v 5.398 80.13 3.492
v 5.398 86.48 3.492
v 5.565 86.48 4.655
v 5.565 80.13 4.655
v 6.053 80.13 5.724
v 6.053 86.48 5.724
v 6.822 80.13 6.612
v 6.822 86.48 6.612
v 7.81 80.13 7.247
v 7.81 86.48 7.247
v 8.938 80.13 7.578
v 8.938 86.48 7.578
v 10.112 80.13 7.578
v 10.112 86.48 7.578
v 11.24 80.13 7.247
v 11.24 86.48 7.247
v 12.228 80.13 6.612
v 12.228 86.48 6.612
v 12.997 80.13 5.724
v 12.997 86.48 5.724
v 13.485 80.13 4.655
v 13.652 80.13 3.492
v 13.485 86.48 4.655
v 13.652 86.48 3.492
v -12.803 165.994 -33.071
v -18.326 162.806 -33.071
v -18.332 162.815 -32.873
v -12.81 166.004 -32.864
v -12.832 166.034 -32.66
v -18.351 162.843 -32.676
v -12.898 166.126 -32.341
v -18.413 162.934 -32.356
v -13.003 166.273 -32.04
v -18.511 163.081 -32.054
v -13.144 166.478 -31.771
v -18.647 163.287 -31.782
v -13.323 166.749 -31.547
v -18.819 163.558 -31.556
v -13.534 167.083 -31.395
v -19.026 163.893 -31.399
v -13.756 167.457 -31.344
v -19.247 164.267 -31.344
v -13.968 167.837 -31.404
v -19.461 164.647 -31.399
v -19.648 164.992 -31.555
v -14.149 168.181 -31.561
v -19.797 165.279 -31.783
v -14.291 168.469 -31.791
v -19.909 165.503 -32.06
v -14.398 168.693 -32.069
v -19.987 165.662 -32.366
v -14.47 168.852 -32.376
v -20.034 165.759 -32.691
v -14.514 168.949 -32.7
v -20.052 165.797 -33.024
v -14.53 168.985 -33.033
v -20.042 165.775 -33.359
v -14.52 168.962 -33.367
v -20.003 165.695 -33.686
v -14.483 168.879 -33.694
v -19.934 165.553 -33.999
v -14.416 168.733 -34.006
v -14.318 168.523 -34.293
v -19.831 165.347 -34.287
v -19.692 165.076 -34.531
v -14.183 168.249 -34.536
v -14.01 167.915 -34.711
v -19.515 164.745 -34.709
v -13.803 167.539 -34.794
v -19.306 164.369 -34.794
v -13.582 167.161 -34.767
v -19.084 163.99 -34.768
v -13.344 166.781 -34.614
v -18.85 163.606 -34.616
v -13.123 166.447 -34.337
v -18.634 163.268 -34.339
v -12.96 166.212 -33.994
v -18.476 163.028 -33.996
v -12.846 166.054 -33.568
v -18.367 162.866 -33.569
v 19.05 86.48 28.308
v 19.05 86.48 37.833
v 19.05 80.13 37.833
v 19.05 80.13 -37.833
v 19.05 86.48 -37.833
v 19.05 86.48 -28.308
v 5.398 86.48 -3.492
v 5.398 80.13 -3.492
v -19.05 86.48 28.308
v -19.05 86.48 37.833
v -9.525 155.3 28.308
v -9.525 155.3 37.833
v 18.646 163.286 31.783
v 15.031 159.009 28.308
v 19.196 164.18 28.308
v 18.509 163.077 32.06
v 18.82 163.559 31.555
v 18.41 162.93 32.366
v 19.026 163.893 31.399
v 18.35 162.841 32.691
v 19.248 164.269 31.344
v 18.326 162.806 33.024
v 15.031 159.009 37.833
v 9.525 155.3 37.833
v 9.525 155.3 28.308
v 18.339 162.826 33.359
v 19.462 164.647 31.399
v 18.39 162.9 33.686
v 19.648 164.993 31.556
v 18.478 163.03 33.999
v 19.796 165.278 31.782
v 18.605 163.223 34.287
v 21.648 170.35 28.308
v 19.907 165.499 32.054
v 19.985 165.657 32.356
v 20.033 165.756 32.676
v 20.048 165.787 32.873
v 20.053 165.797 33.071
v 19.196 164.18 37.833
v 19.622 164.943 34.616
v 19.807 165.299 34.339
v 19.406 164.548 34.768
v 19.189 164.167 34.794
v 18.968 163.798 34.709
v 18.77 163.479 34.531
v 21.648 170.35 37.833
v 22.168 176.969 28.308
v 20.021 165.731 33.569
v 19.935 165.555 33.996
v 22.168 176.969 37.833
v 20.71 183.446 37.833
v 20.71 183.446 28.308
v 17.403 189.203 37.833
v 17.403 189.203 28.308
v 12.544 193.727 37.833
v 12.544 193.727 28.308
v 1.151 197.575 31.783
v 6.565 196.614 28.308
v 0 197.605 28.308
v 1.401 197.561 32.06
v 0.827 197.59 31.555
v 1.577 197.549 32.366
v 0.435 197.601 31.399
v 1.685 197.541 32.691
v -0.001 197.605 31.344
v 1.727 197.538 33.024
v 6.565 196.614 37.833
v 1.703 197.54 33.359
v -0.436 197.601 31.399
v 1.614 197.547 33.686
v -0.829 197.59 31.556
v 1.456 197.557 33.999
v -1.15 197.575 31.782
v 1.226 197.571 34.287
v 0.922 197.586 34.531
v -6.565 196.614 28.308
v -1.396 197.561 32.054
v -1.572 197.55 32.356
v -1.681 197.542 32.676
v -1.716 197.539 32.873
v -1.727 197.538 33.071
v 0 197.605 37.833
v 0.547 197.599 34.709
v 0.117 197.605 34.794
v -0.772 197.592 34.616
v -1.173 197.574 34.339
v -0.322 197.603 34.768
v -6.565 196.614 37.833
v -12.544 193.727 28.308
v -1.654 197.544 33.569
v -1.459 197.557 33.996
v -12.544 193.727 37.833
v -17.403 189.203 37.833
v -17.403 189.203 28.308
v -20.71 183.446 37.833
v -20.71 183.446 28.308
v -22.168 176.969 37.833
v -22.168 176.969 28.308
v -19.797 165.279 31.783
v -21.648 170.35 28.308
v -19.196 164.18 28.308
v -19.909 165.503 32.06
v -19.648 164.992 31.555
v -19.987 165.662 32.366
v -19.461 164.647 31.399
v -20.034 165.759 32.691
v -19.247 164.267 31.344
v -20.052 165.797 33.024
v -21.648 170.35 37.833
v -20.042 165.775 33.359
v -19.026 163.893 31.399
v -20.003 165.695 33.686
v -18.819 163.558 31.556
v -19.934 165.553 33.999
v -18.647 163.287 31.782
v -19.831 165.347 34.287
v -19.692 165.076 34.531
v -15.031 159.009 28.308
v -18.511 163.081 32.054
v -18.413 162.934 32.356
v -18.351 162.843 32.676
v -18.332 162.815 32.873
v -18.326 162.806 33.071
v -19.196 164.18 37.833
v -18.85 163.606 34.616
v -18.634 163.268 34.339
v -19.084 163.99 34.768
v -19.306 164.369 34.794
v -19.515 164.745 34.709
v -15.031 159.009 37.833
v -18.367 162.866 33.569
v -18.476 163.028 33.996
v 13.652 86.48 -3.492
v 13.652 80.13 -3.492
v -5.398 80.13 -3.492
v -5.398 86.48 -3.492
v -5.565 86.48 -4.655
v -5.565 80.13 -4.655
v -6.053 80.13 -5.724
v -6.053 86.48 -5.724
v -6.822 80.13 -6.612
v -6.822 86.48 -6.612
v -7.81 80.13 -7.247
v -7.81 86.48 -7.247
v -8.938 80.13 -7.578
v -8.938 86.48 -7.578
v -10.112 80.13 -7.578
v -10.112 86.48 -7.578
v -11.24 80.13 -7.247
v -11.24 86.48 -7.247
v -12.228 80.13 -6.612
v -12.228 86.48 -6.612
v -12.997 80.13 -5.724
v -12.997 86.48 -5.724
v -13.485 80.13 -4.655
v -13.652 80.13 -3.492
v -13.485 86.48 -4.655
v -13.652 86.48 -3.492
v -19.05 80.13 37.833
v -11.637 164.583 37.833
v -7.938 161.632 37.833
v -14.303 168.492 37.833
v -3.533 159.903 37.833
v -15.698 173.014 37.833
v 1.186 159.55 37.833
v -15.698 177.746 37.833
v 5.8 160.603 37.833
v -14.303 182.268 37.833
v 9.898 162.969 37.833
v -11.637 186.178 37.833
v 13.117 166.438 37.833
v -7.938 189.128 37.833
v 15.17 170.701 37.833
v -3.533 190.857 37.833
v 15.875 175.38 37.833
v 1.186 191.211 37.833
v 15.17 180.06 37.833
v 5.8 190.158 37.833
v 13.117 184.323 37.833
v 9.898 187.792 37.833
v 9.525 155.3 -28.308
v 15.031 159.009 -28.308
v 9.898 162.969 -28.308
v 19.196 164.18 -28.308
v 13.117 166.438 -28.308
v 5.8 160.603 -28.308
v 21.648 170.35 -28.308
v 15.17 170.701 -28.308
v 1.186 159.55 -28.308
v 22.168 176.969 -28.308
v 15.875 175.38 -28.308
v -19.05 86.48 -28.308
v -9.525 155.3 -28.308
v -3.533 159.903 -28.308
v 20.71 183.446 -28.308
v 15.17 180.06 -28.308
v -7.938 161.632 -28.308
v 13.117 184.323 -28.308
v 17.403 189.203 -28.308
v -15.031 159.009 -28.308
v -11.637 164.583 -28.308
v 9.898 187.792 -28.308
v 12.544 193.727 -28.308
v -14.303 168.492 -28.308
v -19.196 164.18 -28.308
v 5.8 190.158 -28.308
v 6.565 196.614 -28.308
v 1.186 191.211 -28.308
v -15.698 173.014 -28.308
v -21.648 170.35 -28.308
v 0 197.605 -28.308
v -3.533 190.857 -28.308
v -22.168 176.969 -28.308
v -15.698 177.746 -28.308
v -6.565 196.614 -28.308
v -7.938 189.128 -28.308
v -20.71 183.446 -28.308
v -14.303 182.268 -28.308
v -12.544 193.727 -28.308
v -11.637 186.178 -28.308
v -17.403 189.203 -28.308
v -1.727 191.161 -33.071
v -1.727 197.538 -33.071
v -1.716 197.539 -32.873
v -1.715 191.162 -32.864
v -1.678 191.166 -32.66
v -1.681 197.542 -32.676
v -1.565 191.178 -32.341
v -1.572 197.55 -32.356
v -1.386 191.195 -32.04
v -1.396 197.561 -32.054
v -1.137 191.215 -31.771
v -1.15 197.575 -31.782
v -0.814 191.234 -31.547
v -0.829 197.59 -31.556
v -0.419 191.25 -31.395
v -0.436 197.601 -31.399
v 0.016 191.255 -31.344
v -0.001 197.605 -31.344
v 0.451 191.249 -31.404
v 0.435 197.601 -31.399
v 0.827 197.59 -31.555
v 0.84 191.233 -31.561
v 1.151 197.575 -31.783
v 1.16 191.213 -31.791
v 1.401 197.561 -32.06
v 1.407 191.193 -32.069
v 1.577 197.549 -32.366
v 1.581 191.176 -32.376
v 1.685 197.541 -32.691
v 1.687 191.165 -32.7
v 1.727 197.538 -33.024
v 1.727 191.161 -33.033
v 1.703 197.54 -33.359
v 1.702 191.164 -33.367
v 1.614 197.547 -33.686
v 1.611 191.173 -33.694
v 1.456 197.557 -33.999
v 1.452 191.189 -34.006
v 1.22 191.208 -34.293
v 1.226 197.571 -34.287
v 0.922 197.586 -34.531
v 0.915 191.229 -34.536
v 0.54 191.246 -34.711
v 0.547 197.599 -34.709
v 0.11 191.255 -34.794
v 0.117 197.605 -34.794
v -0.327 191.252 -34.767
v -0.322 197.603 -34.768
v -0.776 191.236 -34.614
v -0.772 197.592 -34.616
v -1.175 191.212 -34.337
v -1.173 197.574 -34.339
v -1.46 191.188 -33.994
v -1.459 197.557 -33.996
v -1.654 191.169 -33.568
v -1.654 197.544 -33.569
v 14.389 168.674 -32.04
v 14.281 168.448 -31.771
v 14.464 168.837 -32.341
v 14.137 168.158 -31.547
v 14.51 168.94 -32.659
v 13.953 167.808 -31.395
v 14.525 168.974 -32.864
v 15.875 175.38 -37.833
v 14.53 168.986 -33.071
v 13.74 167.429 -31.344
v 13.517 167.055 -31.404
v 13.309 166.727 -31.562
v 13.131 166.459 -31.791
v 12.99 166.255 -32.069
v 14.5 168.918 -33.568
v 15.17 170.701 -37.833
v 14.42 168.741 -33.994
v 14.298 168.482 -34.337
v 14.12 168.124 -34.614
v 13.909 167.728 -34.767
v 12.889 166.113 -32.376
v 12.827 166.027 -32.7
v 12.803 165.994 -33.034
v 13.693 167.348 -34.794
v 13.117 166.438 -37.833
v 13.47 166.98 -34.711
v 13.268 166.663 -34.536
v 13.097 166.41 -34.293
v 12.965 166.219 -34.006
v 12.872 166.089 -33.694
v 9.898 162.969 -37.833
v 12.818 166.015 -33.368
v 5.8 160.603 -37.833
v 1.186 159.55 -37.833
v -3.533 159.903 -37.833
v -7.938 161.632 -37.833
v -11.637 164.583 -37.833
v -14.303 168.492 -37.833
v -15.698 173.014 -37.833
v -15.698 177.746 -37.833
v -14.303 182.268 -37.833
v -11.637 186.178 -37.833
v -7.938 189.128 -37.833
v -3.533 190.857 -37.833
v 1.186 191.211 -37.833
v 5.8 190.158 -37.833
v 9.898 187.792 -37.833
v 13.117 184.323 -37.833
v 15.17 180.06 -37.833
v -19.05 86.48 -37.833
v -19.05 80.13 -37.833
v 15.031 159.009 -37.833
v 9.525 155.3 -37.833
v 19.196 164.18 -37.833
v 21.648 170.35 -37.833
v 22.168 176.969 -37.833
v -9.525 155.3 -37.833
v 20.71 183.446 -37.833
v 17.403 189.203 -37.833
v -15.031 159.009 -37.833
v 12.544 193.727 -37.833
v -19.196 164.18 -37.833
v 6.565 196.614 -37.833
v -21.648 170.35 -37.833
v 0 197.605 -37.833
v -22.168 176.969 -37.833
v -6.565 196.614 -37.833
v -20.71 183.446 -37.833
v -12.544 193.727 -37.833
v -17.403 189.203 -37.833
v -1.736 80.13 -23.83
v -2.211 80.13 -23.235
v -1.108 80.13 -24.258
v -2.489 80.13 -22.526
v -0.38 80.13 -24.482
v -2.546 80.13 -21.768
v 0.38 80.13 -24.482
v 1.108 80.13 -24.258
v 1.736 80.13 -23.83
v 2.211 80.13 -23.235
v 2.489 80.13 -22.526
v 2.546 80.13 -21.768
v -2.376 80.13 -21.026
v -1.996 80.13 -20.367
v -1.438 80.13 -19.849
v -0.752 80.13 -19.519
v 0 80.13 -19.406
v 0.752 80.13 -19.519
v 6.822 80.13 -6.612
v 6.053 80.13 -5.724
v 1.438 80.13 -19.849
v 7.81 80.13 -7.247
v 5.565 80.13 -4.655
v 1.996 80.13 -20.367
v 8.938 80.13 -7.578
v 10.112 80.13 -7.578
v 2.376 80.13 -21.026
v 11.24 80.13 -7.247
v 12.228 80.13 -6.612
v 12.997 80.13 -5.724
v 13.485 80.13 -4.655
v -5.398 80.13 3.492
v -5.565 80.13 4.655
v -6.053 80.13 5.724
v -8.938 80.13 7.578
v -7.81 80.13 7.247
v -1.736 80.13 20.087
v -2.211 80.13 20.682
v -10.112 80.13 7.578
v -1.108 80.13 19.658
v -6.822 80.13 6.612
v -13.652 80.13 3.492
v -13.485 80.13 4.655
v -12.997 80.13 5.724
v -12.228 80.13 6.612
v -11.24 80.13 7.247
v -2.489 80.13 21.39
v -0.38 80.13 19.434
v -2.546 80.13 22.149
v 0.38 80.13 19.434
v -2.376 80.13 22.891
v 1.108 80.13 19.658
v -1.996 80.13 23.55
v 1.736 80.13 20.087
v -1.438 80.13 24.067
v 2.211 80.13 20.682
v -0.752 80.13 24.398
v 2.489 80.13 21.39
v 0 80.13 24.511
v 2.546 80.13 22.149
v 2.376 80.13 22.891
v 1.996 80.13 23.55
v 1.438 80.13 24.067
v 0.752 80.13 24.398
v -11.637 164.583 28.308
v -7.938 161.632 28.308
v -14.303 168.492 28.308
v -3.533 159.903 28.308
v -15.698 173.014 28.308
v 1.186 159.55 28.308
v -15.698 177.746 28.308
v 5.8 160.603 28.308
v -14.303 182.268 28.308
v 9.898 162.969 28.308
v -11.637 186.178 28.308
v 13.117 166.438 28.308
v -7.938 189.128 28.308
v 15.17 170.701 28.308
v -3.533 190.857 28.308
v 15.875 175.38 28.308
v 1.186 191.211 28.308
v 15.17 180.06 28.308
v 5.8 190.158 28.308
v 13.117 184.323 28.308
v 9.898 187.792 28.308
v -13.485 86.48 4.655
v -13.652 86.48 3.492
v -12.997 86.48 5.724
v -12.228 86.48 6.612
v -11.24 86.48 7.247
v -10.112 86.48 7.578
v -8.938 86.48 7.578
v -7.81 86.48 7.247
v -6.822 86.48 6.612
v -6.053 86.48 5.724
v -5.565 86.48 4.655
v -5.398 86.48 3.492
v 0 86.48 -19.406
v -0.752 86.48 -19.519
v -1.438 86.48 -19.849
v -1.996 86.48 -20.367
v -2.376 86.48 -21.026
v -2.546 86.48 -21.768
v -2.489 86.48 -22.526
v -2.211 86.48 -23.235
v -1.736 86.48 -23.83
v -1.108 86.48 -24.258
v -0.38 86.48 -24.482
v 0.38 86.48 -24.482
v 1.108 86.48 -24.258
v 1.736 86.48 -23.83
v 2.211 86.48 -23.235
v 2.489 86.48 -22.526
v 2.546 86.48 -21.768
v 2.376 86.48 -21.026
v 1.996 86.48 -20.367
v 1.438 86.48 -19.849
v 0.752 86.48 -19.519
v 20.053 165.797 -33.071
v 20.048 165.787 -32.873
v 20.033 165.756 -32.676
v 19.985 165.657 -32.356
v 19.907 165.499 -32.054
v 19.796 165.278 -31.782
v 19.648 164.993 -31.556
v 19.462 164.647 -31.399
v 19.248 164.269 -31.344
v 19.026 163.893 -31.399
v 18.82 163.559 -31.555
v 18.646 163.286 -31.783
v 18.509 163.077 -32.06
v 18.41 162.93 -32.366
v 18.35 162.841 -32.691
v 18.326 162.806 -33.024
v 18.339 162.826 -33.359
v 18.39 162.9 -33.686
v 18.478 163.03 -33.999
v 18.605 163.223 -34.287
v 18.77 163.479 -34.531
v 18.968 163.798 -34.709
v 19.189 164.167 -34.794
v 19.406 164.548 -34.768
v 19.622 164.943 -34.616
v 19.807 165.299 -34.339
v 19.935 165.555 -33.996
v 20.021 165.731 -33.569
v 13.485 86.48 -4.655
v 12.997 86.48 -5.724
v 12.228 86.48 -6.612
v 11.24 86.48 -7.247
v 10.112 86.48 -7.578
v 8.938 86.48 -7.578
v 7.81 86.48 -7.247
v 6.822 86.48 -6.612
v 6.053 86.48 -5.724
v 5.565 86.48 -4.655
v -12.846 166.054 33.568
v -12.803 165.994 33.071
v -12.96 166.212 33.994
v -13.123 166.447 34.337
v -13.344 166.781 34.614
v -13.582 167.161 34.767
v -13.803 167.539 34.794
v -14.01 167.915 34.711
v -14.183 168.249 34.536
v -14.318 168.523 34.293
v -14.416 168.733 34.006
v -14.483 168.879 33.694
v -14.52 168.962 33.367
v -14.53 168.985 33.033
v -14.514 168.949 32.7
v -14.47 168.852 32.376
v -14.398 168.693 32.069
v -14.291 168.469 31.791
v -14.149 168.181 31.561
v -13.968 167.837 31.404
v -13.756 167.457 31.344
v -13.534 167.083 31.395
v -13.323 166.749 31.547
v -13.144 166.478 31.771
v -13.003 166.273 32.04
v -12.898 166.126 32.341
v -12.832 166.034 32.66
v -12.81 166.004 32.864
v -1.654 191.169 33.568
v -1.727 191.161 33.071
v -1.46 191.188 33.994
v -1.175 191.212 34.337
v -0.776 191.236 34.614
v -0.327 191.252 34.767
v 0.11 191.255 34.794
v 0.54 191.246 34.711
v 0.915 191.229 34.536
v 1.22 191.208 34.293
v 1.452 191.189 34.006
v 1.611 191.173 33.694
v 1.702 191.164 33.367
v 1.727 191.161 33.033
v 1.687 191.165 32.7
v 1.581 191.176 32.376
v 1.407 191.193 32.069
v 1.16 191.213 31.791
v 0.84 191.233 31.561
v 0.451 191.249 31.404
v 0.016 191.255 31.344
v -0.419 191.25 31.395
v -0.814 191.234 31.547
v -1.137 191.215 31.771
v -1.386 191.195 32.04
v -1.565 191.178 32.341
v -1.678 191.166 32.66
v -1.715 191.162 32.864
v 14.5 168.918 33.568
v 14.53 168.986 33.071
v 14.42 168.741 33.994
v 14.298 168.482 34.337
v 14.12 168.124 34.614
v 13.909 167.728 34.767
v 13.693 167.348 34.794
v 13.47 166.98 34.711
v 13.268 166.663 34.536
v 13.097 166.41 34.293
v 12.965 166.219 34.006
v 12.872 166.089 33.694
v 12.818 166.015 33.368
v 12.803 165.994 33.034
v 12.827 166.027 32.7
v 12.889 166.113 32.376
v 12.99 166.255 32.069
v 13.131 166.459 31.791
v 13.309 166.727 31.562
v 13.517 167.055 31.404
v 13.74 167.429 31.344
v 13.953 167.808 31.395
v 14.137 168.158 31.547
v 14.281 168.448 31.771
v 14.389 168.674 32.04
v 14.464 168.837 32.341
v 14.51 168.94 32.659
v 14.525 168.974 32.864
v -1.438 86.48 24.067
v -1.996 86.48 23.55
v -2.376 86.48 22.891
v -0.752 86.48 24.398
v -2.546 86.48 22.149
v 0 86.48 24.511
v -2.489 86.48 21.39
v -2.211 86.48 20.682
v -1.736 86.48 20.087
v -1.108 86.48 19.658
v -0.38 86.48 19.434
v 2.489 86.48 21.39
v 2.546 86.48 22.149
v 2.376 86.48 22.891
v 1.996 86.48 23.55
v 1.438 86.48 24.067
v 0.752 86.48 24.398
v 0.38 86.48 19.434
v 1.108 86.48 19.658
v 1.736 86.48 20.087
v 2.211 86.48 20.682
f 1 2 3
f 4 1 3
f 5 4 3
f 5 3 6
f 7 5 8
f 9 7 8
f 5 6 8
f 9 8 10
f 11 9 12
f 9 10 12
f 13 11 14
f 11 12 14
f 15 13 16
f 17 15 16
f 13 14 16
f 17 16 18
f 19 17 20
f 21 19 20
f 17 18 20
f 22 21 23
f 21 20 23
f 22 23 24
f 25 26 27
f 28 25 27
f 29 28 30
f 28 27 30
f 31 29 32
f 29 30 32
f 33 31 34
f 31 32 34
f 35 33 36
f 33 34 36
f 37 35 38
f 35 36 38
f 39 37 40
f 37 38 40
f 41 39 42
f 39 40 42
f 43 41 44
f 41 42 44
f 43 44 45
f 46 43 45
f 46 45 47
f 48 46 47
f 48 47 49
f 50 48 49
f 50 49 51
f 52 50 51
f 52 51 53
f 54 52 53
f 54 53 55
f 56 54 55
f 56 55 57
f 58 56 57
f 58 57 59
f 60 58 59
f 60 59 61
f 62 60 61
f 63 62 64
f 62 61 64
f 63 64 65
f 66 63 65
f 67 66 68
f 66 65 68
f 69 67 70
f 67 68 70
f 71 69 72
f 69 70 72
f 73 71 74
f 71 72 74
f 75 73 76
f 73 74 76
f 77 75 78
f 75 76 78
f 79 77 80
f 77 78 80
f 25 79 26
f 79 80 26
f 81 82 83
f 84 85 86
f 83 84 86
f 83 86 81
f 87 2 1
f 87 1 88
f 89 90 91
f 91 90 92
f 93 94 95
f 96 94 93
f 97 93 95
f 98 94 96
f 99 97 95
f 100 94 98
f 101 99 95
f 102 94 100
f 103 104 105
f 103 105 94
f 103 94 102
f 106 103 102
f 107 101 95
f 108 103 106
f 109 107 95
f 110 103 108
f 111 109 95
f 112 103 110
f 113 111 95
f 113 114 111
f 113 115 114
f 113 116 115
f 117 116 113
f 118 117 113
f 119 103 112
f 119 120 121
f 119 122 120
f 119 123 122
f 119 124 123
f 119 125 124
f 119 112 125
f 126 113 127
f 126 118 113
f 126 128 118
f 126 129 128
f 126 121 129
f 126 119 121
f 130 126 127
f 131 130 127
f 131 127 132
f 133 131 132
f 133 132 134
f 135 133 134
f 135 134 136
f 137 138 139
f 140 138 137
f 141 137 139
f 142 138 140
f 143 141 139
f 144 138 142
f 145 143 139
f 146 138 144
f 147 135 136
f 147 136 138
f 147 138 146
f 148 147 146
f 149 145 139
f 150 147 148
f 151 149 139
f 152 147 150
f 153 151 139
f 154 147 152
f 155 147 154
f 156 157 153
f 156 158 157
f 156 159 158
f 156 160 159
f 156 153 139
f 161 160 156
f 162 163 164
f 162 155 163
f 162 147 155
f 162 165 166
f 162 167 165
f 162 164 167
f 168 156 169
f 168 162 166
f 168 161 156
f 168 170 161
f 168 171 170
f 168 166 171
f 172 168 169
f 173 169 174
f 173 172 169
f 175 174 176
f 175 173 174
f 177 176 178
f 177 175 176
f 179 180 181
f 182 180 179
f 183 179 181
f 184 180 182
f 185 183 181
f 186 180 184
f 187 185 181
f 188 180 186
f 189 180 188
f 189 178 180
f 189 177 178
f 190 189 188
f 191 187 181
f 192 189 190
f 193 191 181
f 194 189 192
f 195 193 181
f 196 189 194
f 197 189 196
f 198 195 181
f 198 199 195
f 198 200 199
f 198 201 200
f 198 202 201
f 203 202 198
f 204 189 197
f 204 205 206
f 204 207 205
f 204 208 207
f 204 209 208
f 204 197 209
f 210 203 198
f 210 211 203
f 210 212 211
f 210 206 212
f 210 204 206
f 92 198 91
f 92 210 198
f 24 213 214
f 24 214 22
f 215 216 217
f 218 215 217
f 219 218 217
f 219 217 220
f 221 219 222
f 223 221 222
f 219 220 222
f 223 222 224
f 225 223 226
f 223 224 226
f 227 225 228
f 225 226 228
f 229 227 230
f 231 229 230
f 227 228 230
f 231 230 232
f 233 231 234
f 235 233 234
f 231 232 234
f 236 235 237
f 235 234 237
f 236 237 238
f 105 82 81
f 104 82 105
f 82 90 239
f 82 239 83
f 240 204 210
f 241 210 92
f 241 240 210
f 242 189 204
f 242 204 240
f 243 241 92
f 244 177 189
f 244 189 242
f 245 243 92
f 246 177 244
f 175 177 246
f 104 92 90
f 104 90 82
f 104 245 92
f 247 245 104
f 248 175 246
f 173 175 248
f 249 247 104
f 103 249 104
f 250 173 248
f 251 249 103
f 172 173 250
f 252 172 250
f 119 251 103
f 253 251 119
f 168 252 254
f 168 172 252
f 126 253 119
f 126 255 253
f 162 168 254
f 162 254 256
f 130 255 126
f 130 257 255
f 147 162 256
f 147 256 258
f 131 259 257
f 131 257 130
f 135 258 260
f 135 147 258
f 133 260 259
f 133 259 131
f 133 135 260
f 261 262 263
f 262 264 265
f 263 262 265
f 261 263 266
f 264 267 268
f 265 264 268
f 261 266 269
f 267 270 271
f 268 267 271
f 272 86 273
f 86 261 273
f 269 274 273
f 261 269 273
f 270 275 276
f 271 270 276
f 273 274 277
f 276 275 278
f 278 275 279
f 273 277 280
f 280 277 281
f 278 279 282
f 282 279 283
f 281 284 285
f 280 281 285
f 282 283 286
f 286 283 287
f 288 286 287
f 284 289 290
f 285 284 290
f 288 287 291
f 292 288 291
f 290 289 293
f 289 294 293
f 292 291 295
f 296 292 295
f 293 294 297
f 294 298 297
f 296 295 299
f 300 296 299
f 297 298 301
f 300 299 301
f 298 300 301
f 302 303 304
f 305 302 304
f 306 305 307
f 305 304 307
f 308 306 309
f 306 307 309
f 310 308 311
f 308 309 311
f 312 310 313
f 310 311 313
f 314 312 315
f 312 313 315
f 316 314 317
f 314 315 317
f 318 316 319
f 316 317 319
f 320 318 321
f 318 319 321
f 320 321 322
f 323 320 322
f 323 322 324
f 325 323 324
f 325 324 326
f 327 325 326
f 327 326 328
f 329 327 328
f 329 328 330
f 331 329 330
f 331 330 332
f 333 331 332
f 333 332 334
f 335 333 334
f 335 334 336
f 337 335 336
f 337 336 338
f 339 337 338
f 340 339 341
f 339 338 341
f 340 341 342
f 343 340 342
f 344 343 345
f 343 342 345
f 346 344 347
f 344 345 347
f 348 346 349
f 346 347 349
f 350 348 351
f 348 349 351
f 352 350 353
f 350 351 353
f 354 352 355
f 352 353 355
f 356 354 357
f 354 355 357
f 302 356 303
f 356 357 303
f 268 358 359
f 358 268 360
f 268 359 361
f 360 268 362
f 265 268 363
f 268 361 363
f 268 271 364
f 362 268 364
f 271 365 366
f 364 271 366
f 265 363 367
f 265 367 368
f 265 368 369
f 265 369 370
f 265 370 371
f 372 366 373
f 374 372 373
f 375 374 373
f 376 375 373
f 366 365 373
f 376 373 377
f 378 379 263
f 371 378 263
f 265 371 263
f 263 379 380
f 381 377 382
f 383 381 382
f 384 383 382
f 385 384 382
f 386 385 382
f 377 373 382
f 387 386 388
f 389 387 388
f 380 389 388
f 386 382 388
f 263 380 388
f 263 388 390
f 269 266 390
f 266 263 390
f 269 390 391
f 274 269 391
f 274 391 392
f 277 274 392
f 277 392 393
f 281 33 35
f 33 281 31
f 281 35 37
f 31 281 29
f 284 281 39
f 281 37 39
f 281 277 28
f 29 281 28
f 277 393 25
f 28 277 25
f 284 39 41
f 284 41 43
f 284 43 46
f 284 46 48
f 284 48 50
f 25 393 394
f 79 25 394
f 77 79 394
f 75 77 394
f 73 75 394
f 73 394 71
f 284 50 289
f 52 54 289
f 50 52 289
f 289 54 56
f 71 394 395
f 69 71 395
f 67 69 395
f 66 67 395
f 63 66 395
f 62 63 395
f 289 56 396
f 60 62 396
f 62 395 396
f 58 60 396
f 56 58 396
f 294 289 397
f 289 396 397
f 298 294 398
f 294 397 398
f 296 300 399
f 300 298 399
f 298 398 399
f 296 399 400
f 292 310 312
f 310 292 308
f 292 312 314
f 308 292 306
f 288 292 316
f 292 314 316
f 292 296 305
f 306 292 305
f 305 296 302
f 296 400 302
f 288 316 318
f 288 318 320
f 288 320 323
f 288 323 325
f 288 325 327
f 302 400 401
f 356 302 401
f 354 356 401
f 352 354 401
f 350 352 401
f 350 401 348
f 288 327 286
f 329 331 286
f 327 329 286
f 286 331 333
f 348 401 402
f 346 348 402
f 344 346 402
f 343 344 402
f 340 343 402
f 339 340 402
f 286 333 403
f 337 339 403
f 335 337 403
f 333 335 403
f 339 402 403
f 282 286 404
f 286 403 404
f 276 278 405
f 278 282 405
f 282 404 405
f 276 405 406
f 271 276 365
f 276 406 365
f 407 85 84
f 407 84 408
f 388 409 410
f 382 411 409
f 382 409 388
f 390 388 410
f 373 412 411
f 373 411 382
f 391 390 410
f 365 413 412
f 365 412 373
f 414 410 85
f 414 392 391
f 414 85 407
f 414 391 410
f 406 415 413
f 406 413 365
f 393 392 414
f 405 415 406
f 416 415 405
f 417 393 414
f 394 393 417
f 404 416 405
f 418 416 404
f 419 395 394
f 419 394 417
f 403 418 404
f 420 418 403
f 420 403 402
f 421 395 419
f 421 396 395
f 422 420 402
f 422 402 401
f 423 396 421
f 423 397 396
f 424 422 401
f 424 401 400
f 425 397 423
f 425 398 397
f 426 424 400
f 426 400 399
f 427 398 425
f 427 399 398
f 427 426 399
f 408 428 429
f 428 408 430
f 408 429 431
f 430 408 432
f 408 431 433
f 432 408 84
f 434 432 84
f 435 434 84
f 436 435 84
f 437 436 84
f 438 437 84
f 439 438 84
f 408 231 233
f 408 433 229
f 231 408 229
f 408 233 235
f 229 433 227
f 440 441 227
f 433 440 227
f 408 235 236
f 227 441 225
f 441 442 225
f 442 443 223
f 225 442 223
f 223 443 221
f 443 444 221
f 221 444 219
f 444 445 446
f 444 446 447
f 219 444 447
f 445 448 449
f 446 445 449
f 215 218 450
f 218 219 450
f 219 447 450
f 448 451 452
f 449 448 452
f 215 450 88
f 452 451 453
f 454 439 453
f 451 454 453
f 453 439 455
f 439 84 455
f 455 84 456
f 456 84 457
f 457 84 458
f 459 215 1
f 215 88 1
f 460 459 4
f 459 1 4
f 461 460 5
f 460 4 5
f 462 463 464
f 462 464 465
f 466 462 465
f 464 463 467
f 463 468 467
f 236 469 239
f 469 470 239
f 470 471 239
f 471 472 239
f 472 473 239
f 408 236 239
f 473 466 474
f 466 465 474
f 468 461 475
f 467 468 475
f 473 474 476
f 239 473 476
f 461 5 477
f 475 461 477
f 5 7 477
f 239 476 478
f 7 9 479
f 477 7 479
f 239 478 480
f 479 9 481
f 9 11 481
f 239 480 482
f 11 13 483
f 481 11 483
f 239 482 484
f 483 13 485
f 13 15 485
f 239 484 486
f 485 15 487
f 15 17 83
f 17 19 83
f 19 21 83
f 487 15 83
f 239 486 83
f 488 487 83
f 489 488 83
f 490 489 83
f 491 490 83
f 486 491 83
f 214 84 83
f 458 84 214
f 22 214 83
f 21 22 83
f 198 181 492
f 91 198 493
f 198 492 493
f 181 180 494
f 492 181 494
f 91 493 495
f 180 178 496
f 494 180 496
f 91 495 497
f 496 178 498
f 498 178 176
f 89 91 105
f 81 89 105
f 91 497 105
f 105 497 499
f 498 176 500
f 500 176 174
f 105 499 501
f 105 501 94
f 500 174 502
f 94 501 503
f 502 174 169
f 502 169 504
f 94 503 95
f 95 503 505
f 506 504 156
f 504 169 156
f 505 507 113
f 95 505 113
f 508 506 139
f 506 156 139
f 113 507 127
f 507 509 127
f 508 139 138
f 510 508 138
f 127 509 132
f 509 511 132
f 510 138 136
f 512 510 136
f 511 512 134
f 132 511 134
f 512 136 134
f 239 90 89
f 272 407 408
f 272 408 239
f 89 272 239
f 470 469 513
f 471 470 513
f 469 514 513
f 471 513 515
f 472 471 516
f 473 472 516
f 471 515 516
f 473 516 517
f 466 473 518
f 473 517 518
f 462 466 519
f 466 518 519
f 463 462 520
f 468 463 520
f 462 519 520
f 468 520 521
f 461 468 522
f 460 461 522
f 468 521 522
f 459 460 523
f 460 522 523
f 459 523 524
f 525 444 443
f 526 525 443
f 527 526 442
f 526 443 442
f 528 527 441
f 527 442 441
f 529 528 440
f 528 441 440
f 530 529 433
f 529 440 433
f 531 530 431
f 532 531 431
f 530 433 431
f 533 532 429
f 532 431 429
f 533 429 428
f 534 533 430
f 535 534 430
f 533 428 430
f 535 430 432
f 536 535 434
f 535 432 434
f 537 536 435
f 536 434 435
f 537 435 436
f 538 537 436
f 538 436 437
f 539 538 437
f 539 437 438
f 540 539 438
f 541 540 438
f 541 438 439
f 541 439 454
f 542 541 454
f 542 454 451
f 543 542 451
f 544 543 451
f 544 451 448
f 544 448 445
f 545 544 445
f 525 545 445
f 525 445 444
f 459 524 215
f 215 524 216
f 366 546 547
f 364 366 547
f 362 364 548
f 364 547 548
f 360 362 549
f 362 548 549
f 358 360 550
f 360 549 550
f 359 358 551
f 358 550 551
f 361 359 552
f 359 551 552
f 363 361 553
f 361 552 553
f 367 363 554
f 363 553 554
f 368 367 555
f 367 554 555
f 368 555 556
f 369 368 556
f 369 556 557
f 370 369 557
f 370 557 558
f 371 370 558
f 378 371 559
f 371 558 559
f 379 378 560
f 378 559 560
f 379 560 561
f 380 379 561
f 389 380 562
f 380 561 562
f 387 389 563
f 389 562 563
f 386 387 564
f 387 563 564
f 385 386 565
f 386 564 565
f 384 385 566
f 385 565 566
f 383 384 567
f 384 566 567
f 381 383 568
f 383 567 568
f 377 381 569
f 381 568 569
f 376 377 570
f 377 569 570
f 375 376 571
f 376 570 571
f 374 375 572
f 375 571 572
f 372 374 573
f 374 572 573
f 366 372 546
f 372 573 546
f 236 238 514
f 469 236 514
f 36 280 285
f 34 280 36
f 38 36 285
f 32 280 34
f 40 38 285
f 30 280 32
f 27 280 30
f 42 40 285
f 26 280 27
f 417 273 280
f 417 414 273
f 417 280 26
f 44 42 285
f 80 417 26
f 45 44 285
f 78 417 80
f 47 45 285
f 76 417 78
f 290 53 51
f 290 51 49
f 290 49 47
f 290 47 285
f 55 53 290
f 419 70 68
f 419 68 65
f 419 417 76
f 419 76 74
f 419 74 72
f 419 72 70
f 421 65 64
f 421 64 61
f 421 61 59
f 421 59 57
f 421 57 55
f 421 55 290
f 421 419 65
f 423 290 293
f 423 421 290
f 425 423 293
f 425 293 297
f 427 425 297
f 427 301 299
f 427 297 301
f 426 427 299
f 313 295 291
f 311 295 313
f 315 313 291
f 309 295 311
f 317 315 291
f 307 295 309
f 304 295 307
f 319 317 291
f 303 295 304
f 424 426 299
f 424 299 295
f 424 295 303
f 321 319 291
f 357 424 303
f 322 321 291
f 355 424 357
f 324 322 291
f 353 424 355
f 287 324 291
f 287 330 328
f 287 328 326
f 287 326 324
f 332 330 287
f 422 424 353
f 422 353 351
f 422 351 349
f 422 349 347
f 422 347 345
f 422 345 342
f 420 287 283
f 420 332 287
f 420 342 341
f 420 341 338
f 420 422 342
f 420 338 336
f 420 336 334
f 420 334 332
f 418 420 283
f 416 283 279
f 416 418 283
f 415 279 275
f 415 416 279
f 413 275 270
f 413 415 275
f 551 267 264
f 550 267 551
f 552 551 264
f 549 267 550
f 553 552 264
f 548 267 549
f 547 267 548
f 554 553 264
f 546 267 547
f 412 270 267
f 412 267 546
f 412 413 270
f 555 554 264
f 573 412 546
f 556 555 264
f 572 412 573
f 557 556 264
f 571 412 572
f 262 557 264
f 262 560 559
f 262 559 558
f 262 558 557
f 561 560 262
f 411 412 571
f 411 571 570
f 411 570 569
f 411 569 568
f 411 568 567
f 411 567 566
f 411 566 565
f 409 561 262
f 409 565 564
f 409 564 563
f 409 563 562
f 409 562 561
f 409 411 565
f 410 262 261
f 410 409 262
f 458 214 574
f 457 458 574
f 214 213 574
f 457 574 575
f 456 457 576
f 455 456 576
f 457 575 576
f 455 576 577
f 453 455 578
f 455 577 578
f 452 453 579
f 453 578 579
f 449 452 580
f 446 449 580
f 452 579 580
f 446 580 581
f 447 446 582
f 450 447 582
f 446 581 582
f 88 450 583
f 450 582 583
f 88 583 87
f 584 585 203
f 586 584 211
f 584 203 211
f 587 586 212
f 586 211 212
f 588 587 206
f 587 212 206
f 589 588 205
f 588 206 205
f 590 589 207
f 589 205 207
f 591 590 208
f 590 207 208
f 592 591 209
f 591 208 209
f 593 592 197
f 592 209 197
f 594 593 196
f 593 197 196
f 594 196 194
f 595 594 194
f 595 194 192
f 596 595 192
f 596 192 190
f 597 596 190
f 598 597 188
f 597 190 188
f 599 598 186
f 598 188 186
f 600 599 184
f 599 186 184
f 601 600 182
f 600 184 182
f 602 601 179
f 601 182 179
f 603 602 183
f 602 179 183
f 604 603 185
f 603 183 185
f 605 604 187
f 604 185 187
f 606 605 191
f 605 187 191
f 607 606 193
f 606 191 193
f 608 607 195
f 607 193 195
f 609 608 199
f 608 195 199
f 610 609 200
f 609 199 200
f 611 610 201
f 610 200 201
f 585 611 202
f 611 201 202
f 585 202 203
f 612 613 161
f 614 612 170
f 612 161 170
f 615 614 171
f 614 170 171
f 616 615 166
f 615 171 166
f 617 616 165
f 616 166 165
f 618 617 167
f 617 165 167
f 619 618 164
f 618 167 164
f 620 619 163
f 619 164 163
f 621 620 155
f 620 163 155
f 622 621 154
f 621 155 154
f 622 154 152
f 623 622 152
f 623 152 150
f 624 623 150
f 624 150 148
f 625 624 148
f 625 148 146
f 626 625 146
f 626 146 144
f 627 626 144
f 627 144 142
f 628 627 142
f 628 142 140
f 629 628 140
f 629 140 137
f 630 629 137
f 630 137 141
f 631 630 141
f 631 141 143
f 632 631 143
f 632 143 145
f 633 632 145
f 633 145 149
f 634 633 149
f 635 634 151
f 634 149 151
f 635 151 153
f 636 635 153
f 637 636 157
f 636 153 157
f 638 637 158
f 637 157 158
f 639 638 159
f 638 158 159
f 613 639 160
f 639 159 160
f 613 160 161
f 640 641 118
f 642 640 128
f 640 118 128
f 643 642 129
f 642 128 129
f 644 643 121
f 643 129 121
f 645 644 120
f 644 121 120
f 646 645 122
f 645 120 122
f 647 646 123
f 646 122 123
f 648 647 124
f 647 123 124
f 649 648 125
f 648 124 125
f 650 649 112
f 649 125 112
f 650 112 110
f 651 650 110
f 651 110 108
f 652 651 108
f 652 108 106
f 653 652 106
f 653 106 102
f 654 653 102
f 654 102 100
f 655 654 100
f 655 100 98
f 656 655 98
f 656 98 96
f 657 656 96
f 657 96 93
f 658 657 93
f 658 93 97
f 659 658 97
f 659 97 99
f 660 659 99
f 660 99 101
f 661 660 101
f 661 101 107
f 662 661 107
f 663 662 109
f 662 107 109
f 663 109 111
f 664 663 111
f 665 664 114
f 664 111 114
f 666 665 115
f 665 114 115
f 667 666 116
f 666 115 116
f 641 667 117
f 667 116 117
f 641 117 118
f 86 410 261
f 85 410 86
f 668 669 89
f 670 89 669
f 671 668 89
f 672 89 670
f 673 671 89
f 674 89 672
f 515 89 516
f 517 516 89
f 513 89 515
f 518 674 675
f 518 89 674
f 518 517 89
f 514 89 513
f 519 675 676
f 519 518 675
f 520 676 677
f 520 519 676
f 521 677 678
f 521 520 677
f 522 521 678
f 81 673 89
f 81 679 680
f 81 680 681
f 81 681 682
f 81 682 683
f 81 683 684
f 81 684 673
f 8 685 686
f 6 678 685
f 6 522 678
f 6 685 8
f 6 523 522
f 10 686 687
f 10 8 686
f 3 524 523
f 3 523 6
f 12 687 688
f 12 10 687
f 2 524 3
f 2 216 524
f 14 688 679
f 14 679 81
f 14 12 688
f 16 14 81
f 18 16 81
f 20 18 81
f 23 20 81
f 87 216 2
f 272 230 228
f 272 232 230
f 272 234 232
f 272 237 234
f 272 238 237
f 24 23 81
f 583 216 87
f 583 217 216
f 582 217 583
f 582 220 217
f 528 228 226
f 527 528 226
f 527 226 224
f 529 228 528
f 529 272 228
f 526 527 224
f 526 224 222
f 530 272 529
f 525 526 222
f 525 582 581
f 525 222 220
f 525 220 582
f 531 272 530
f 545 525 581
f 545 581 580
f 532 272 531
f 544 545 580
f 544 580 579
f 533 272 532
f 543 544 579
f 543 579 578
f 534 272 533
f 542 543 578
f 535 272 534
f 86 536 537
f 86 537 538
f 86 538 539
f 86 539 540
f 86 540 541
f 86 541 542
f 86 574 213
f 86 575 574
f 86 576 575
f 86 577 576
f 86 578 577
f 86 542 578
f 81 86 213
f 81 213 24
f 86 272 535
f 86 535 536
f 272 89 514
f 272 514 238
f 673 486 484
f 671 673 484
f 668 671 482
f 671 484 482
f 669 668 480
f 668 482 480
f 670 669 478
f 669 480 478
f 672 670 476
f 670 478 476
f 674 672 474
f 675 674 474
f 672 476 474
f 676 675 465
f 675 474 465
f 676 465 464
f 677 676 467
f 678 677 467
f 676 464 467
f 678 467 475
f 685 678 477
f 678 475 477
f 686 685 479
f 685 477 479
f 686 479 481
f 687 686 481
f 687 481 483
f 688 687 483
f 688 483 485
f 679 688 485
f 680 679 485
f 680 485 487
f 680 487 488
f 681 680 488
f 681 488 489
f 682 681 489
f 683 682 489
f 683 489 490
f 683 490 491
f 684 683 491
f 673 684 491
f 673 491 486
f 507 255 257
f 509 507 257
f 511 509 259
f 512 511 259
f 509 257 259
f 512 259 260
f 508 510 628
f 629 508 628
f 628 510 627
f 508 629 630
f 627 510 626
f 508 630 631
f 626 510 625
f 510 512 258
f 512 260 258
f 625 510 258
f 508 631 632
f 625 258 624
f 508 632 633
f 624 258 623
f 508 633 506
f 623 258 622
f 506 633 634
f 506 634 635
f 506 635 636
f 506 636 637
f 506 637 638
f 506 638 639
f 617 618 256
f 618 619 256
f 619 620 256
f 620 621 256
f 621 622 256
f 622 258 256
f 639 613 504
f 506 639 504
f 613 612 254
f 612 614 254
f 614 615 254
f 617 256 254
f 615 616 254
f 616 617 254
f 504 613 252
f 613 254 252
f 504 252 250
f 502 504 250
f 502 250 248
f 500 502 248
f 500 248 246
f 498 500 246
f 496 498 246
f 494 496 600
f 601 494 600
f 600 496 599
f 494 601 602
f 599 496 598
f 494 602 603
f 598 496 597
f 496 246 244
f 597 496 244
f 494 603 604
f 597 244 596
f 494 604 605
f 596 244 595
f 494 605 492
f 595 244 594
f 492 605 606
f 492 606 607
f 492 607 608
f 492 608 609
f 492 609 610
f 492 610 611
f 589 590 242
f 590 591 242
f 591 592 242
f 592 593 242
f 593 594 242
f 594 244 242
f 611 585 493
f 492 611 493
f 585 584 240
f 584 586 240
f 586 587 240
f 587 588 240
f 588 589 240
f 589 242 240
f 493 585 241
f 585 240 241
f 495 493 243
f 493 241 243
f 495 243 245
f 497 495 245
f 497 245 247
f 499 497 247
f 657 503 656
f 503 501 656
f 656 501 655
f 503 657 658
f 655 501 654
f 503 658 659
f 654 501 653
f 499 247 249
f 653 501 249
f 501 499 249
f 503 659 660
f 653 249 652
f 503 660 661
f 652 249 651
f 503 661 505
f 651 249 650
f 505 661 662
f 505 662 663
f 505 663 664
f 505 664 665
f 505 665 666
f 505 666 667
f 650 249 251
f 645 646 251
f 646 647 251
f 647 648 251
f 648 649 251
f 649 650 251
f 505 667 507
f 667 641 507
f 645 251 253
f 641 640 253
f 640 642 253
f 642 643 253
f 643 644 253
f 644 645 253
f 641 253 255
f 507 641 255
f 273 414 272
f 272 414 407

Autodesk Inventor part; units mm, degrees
ref_plane "YZ Plane" through (0, 0, 0) normal (1, 0, 0) x (0, 1, 0)
sketch "Sketch1" plane through (0, 0, 0) normal (0, 0, 1) x (1, 0, 0)
  arc A0 (19.05, 73.7803) -> (-19.05, 73.7803) centre (0, 0) ccw
  line L0 (0, 86.4803) -> (19.05, 86.4803)
  line L1 (19.05, 86.4803) -> (19.05, 73.7803)
  line L2 (0, 76.2) -> (0, 86.4803) construction
  line L3 (0, 86.4803) -> (-19.05, 86.4803)
  line L4 (-19.05, 86.4803) -> (-19.05, 73.7803)
  dimension "d0" = 152.4
  dimension "d1" = 19.05
  dimension "d2" = 12.7
extrude "Extrusion1" add sketch "Sketch1" along normal mid plane 75.6666
sketch "Sketch2" plane through (-19.05, 86.4803, 37.8333) normal (0, 1, 0) x (1, 0, 0)
  line L0 (0, 75.6666) -> (0, 0) construction
  line L1 (0, 37.8333) -> (38.1, 37.8333) construction
  line L2 (38.1, 75.6666) -> (38.1, 0) construction
  line L3 (0, 75.6666) -> (38.1, 75.6666) construction
  line L4 (19.05, 75.6666) -> (19.05, 0) construction
  line L5 (38.1, 0) -> (0, 0) construction
  line L6 (28.575, 34.3408) -> (28.575, 41.3258) construction
  line L7 (24.4475, 34.3408) -> (24.4475, 41.3258)
  line L8 (32.7025, 41.3258) -> (32.7025, 34.3408)
  arc A0 (24.4475, 34.3408) -> (32.7025, 34.3408) centre (28.575, 34.3408) ccw
  arc A1 (32.7025, 41.3258) -> (24.4475, 41.3258) centre (28.575, 41.3258) ccw
  line L9 (13.6525, 34.3408) -> (13.6525, 41.3258)
  line L10 (5.3975, 41.3258) -> (5.3975, 34.3408)
  arc A2 (5.3975, 34.3408) -> (13.6525, 34.3408) centre (9.525, 34.3408) ccw
  arc A3 (13.6525, 41.3258) -> (5.3975, 41.3258) centre (9.525, 41.3258) ccw
  point P0 (19.05, 37.8333)
  point P1 (28.575, 37.8333)
  dimension "d5" = 9.525
  dimension "d6" = 8.255
  dimension "d7" = 15.24
  dimension "d8" = 19.05
  dimension "d170" = 8.255
extrude "Extrusion2" cut sketch "Sketch2" against normal through all
ref_plane "Work Plane1" through (19.05, 73.7803, 37.8333) normal (0, 1, 0) x (-1, 0, 0)
sketch "Sketch5" plane through (0, 0, 37.8333) normal (0, 0, 1) x (1, 0, 0)
  circle A0 centre (0, 175.3803) radius 15.875
  arc A1 (9.525, 155.2999) -> (-9.525, 155.2999) centre (0, 175.3803) ccw
  arc A2 (19.05, 73.7803) -> (-19.05, 73.7803) centre (0, 0) ccw construction
  line L0 (-19.05, 73.7803) -> (19.05, 73.7803) construction
  line L1 (19.05, 86.4803) -> (9.525, 155.2999)
  line L2 (19.05, 86.4803) -> (-19.05, 86.4803) construction
  line L3 (0, 86.4803) -> (0, 175.3803) construction
  line L4 (-19.05, 86.4803) -> (-9.525, 155.2999)
  line L5 (-19.05, 86.4803) -> (19.05, 86.4803)
  dimension "d15" = 31.75
  dimension "d16" = 6.35
  dimension "d17" = 101.6
  dimension "d18" = 9.525
extrude "Extrusion4" add sketch "Sketch5" against normal blind 9.525
ref_plane "Work Plane2" through (0, 197.6053, 37.8333) normal (0, 1, 0) x (-1, 0, 0)
sketch "Sketch6" plane through (0, 197.6053, 37.8333) normal (0, 1, 0) x (-1, 0, 0)
  line L0 (-22.225, -9.525) -> (22.225, -9.525) projected
  circle A0 centre (0, -4.7625) radius 1.7272
  point P0 (0, -37.8333)
  point P1 (9.525, -9.525)
  point P2 (-9.525, -9.525)
  dimension "d21" = 4.7625
  dimension "d22" = 3.4544
extrude "Extrusion5" cut sketch "Sketch6" against normal up to surface
pattern_circular "Circular Pattern1" count 3 over 360 about axis through (0, 175.3803, 37.8333) along (0, 0, -1) of "Extrusion5"
mirror "Mirror1" about plane through (0, 0, 0) normal (0, 0, 1) of "Extrusion4", "Extrusion5", "Circular Pattern1"
sketch "Sketch20" plane through (19.05, 73.7803, 37.8333) normal (1, 0, 0) x (0, 0, -1)
  line L0 (0, 12.7) -> (0, 0) projected
  line L1 (75.6666, 12.7) -> (75.6666, 0) projected
  line L2 (0, 0) -> (75.6666, 0)
  line L3 (75.6666, 0) -> (75.6666, 6.35)
  line L4 (75.6666, 6.35) -> (0, 6.35)
  line L5 (0, 6.35) -> (0, 0)
  point P0 (37.8333, -73.7803)
  point P1 (0, 6.35)
extrude "Extrusion7" cut sketch "Sketch20" against normal through all
sketch "Sketch22" plane through (-19.05, 86.4803, 28.3083) normal (0, 1, 0) x (1, 0, 0)
  line L0 (41.275, 0) -> (-3.175, 0) projected
  line L1 (41.275, 56.6166) -> (-3.175, 56.6166) projected
  line L2 (-3.175, 66.1416) -> (41.275, 66.1416) projected
  point P0 (19.05, 28.3083)
  point P1 (19.05, 6.35)
  point P2 (19.05, 50.2666)
  point P3 (9.525, 0)
  point P4 (28.575, 0)
  point P5 (9.525, 56.6166)
  point P6 (28.575, 56.6166)
  point P7 (28.575, 66.1416)
  point P8 (9.525, 66.1416)
  dimension "d173" = 6.35
  dimension "d174" = 6.35
  dimension "d183" = 15.875
hole "Hole1" at (0, 86.4803, 21.9583) at (0, 86.4803, -21.9583) direction (0, -1, 0) diameter 5.1054 end through all clearance for "Socket Head Cap Screw" size "#10" standard "Ansi Unified Screw Threads"
equation "\"d51\" = 0.125 * Sketch8_Pitch"
equation "\"Sketch8_Pitch\" = 0.79375"
equation "\"d53\" = 60deg"
equation "\"d72\" = 0.125 * Sketch10_Pitch"
equation "\"Sketch10_Pitch\" = 0.79375"
equation "\"d74\" = 60deg"
equation "\"d93\" = 0.125 * Sketch12_Pitch"
equation "\"Sketch12_Pitch\" = 0.79375"
equation "\"d95\" = 60deg"
equation "\"d114\" = 0.125 * Sketch14_Pitch"
equation "\"Sketch14_Pitch\" = 0.79375"
equation "\"d116\" = 60deg"
equation "\"d135\" = 0.125 * Sketch16_Pitch"
equation "\"Sketch16_Pitch\" = 0.79375"
equation "\"d137\" = 60deg"
equation "\"d156\" = 0.125 * Sketch18_Pitch"
equation "\"Sketch18_Pitch\" = 0.79375"
equation "\"d158\" = 60deg"
properties part number "finderMainPartV05"
